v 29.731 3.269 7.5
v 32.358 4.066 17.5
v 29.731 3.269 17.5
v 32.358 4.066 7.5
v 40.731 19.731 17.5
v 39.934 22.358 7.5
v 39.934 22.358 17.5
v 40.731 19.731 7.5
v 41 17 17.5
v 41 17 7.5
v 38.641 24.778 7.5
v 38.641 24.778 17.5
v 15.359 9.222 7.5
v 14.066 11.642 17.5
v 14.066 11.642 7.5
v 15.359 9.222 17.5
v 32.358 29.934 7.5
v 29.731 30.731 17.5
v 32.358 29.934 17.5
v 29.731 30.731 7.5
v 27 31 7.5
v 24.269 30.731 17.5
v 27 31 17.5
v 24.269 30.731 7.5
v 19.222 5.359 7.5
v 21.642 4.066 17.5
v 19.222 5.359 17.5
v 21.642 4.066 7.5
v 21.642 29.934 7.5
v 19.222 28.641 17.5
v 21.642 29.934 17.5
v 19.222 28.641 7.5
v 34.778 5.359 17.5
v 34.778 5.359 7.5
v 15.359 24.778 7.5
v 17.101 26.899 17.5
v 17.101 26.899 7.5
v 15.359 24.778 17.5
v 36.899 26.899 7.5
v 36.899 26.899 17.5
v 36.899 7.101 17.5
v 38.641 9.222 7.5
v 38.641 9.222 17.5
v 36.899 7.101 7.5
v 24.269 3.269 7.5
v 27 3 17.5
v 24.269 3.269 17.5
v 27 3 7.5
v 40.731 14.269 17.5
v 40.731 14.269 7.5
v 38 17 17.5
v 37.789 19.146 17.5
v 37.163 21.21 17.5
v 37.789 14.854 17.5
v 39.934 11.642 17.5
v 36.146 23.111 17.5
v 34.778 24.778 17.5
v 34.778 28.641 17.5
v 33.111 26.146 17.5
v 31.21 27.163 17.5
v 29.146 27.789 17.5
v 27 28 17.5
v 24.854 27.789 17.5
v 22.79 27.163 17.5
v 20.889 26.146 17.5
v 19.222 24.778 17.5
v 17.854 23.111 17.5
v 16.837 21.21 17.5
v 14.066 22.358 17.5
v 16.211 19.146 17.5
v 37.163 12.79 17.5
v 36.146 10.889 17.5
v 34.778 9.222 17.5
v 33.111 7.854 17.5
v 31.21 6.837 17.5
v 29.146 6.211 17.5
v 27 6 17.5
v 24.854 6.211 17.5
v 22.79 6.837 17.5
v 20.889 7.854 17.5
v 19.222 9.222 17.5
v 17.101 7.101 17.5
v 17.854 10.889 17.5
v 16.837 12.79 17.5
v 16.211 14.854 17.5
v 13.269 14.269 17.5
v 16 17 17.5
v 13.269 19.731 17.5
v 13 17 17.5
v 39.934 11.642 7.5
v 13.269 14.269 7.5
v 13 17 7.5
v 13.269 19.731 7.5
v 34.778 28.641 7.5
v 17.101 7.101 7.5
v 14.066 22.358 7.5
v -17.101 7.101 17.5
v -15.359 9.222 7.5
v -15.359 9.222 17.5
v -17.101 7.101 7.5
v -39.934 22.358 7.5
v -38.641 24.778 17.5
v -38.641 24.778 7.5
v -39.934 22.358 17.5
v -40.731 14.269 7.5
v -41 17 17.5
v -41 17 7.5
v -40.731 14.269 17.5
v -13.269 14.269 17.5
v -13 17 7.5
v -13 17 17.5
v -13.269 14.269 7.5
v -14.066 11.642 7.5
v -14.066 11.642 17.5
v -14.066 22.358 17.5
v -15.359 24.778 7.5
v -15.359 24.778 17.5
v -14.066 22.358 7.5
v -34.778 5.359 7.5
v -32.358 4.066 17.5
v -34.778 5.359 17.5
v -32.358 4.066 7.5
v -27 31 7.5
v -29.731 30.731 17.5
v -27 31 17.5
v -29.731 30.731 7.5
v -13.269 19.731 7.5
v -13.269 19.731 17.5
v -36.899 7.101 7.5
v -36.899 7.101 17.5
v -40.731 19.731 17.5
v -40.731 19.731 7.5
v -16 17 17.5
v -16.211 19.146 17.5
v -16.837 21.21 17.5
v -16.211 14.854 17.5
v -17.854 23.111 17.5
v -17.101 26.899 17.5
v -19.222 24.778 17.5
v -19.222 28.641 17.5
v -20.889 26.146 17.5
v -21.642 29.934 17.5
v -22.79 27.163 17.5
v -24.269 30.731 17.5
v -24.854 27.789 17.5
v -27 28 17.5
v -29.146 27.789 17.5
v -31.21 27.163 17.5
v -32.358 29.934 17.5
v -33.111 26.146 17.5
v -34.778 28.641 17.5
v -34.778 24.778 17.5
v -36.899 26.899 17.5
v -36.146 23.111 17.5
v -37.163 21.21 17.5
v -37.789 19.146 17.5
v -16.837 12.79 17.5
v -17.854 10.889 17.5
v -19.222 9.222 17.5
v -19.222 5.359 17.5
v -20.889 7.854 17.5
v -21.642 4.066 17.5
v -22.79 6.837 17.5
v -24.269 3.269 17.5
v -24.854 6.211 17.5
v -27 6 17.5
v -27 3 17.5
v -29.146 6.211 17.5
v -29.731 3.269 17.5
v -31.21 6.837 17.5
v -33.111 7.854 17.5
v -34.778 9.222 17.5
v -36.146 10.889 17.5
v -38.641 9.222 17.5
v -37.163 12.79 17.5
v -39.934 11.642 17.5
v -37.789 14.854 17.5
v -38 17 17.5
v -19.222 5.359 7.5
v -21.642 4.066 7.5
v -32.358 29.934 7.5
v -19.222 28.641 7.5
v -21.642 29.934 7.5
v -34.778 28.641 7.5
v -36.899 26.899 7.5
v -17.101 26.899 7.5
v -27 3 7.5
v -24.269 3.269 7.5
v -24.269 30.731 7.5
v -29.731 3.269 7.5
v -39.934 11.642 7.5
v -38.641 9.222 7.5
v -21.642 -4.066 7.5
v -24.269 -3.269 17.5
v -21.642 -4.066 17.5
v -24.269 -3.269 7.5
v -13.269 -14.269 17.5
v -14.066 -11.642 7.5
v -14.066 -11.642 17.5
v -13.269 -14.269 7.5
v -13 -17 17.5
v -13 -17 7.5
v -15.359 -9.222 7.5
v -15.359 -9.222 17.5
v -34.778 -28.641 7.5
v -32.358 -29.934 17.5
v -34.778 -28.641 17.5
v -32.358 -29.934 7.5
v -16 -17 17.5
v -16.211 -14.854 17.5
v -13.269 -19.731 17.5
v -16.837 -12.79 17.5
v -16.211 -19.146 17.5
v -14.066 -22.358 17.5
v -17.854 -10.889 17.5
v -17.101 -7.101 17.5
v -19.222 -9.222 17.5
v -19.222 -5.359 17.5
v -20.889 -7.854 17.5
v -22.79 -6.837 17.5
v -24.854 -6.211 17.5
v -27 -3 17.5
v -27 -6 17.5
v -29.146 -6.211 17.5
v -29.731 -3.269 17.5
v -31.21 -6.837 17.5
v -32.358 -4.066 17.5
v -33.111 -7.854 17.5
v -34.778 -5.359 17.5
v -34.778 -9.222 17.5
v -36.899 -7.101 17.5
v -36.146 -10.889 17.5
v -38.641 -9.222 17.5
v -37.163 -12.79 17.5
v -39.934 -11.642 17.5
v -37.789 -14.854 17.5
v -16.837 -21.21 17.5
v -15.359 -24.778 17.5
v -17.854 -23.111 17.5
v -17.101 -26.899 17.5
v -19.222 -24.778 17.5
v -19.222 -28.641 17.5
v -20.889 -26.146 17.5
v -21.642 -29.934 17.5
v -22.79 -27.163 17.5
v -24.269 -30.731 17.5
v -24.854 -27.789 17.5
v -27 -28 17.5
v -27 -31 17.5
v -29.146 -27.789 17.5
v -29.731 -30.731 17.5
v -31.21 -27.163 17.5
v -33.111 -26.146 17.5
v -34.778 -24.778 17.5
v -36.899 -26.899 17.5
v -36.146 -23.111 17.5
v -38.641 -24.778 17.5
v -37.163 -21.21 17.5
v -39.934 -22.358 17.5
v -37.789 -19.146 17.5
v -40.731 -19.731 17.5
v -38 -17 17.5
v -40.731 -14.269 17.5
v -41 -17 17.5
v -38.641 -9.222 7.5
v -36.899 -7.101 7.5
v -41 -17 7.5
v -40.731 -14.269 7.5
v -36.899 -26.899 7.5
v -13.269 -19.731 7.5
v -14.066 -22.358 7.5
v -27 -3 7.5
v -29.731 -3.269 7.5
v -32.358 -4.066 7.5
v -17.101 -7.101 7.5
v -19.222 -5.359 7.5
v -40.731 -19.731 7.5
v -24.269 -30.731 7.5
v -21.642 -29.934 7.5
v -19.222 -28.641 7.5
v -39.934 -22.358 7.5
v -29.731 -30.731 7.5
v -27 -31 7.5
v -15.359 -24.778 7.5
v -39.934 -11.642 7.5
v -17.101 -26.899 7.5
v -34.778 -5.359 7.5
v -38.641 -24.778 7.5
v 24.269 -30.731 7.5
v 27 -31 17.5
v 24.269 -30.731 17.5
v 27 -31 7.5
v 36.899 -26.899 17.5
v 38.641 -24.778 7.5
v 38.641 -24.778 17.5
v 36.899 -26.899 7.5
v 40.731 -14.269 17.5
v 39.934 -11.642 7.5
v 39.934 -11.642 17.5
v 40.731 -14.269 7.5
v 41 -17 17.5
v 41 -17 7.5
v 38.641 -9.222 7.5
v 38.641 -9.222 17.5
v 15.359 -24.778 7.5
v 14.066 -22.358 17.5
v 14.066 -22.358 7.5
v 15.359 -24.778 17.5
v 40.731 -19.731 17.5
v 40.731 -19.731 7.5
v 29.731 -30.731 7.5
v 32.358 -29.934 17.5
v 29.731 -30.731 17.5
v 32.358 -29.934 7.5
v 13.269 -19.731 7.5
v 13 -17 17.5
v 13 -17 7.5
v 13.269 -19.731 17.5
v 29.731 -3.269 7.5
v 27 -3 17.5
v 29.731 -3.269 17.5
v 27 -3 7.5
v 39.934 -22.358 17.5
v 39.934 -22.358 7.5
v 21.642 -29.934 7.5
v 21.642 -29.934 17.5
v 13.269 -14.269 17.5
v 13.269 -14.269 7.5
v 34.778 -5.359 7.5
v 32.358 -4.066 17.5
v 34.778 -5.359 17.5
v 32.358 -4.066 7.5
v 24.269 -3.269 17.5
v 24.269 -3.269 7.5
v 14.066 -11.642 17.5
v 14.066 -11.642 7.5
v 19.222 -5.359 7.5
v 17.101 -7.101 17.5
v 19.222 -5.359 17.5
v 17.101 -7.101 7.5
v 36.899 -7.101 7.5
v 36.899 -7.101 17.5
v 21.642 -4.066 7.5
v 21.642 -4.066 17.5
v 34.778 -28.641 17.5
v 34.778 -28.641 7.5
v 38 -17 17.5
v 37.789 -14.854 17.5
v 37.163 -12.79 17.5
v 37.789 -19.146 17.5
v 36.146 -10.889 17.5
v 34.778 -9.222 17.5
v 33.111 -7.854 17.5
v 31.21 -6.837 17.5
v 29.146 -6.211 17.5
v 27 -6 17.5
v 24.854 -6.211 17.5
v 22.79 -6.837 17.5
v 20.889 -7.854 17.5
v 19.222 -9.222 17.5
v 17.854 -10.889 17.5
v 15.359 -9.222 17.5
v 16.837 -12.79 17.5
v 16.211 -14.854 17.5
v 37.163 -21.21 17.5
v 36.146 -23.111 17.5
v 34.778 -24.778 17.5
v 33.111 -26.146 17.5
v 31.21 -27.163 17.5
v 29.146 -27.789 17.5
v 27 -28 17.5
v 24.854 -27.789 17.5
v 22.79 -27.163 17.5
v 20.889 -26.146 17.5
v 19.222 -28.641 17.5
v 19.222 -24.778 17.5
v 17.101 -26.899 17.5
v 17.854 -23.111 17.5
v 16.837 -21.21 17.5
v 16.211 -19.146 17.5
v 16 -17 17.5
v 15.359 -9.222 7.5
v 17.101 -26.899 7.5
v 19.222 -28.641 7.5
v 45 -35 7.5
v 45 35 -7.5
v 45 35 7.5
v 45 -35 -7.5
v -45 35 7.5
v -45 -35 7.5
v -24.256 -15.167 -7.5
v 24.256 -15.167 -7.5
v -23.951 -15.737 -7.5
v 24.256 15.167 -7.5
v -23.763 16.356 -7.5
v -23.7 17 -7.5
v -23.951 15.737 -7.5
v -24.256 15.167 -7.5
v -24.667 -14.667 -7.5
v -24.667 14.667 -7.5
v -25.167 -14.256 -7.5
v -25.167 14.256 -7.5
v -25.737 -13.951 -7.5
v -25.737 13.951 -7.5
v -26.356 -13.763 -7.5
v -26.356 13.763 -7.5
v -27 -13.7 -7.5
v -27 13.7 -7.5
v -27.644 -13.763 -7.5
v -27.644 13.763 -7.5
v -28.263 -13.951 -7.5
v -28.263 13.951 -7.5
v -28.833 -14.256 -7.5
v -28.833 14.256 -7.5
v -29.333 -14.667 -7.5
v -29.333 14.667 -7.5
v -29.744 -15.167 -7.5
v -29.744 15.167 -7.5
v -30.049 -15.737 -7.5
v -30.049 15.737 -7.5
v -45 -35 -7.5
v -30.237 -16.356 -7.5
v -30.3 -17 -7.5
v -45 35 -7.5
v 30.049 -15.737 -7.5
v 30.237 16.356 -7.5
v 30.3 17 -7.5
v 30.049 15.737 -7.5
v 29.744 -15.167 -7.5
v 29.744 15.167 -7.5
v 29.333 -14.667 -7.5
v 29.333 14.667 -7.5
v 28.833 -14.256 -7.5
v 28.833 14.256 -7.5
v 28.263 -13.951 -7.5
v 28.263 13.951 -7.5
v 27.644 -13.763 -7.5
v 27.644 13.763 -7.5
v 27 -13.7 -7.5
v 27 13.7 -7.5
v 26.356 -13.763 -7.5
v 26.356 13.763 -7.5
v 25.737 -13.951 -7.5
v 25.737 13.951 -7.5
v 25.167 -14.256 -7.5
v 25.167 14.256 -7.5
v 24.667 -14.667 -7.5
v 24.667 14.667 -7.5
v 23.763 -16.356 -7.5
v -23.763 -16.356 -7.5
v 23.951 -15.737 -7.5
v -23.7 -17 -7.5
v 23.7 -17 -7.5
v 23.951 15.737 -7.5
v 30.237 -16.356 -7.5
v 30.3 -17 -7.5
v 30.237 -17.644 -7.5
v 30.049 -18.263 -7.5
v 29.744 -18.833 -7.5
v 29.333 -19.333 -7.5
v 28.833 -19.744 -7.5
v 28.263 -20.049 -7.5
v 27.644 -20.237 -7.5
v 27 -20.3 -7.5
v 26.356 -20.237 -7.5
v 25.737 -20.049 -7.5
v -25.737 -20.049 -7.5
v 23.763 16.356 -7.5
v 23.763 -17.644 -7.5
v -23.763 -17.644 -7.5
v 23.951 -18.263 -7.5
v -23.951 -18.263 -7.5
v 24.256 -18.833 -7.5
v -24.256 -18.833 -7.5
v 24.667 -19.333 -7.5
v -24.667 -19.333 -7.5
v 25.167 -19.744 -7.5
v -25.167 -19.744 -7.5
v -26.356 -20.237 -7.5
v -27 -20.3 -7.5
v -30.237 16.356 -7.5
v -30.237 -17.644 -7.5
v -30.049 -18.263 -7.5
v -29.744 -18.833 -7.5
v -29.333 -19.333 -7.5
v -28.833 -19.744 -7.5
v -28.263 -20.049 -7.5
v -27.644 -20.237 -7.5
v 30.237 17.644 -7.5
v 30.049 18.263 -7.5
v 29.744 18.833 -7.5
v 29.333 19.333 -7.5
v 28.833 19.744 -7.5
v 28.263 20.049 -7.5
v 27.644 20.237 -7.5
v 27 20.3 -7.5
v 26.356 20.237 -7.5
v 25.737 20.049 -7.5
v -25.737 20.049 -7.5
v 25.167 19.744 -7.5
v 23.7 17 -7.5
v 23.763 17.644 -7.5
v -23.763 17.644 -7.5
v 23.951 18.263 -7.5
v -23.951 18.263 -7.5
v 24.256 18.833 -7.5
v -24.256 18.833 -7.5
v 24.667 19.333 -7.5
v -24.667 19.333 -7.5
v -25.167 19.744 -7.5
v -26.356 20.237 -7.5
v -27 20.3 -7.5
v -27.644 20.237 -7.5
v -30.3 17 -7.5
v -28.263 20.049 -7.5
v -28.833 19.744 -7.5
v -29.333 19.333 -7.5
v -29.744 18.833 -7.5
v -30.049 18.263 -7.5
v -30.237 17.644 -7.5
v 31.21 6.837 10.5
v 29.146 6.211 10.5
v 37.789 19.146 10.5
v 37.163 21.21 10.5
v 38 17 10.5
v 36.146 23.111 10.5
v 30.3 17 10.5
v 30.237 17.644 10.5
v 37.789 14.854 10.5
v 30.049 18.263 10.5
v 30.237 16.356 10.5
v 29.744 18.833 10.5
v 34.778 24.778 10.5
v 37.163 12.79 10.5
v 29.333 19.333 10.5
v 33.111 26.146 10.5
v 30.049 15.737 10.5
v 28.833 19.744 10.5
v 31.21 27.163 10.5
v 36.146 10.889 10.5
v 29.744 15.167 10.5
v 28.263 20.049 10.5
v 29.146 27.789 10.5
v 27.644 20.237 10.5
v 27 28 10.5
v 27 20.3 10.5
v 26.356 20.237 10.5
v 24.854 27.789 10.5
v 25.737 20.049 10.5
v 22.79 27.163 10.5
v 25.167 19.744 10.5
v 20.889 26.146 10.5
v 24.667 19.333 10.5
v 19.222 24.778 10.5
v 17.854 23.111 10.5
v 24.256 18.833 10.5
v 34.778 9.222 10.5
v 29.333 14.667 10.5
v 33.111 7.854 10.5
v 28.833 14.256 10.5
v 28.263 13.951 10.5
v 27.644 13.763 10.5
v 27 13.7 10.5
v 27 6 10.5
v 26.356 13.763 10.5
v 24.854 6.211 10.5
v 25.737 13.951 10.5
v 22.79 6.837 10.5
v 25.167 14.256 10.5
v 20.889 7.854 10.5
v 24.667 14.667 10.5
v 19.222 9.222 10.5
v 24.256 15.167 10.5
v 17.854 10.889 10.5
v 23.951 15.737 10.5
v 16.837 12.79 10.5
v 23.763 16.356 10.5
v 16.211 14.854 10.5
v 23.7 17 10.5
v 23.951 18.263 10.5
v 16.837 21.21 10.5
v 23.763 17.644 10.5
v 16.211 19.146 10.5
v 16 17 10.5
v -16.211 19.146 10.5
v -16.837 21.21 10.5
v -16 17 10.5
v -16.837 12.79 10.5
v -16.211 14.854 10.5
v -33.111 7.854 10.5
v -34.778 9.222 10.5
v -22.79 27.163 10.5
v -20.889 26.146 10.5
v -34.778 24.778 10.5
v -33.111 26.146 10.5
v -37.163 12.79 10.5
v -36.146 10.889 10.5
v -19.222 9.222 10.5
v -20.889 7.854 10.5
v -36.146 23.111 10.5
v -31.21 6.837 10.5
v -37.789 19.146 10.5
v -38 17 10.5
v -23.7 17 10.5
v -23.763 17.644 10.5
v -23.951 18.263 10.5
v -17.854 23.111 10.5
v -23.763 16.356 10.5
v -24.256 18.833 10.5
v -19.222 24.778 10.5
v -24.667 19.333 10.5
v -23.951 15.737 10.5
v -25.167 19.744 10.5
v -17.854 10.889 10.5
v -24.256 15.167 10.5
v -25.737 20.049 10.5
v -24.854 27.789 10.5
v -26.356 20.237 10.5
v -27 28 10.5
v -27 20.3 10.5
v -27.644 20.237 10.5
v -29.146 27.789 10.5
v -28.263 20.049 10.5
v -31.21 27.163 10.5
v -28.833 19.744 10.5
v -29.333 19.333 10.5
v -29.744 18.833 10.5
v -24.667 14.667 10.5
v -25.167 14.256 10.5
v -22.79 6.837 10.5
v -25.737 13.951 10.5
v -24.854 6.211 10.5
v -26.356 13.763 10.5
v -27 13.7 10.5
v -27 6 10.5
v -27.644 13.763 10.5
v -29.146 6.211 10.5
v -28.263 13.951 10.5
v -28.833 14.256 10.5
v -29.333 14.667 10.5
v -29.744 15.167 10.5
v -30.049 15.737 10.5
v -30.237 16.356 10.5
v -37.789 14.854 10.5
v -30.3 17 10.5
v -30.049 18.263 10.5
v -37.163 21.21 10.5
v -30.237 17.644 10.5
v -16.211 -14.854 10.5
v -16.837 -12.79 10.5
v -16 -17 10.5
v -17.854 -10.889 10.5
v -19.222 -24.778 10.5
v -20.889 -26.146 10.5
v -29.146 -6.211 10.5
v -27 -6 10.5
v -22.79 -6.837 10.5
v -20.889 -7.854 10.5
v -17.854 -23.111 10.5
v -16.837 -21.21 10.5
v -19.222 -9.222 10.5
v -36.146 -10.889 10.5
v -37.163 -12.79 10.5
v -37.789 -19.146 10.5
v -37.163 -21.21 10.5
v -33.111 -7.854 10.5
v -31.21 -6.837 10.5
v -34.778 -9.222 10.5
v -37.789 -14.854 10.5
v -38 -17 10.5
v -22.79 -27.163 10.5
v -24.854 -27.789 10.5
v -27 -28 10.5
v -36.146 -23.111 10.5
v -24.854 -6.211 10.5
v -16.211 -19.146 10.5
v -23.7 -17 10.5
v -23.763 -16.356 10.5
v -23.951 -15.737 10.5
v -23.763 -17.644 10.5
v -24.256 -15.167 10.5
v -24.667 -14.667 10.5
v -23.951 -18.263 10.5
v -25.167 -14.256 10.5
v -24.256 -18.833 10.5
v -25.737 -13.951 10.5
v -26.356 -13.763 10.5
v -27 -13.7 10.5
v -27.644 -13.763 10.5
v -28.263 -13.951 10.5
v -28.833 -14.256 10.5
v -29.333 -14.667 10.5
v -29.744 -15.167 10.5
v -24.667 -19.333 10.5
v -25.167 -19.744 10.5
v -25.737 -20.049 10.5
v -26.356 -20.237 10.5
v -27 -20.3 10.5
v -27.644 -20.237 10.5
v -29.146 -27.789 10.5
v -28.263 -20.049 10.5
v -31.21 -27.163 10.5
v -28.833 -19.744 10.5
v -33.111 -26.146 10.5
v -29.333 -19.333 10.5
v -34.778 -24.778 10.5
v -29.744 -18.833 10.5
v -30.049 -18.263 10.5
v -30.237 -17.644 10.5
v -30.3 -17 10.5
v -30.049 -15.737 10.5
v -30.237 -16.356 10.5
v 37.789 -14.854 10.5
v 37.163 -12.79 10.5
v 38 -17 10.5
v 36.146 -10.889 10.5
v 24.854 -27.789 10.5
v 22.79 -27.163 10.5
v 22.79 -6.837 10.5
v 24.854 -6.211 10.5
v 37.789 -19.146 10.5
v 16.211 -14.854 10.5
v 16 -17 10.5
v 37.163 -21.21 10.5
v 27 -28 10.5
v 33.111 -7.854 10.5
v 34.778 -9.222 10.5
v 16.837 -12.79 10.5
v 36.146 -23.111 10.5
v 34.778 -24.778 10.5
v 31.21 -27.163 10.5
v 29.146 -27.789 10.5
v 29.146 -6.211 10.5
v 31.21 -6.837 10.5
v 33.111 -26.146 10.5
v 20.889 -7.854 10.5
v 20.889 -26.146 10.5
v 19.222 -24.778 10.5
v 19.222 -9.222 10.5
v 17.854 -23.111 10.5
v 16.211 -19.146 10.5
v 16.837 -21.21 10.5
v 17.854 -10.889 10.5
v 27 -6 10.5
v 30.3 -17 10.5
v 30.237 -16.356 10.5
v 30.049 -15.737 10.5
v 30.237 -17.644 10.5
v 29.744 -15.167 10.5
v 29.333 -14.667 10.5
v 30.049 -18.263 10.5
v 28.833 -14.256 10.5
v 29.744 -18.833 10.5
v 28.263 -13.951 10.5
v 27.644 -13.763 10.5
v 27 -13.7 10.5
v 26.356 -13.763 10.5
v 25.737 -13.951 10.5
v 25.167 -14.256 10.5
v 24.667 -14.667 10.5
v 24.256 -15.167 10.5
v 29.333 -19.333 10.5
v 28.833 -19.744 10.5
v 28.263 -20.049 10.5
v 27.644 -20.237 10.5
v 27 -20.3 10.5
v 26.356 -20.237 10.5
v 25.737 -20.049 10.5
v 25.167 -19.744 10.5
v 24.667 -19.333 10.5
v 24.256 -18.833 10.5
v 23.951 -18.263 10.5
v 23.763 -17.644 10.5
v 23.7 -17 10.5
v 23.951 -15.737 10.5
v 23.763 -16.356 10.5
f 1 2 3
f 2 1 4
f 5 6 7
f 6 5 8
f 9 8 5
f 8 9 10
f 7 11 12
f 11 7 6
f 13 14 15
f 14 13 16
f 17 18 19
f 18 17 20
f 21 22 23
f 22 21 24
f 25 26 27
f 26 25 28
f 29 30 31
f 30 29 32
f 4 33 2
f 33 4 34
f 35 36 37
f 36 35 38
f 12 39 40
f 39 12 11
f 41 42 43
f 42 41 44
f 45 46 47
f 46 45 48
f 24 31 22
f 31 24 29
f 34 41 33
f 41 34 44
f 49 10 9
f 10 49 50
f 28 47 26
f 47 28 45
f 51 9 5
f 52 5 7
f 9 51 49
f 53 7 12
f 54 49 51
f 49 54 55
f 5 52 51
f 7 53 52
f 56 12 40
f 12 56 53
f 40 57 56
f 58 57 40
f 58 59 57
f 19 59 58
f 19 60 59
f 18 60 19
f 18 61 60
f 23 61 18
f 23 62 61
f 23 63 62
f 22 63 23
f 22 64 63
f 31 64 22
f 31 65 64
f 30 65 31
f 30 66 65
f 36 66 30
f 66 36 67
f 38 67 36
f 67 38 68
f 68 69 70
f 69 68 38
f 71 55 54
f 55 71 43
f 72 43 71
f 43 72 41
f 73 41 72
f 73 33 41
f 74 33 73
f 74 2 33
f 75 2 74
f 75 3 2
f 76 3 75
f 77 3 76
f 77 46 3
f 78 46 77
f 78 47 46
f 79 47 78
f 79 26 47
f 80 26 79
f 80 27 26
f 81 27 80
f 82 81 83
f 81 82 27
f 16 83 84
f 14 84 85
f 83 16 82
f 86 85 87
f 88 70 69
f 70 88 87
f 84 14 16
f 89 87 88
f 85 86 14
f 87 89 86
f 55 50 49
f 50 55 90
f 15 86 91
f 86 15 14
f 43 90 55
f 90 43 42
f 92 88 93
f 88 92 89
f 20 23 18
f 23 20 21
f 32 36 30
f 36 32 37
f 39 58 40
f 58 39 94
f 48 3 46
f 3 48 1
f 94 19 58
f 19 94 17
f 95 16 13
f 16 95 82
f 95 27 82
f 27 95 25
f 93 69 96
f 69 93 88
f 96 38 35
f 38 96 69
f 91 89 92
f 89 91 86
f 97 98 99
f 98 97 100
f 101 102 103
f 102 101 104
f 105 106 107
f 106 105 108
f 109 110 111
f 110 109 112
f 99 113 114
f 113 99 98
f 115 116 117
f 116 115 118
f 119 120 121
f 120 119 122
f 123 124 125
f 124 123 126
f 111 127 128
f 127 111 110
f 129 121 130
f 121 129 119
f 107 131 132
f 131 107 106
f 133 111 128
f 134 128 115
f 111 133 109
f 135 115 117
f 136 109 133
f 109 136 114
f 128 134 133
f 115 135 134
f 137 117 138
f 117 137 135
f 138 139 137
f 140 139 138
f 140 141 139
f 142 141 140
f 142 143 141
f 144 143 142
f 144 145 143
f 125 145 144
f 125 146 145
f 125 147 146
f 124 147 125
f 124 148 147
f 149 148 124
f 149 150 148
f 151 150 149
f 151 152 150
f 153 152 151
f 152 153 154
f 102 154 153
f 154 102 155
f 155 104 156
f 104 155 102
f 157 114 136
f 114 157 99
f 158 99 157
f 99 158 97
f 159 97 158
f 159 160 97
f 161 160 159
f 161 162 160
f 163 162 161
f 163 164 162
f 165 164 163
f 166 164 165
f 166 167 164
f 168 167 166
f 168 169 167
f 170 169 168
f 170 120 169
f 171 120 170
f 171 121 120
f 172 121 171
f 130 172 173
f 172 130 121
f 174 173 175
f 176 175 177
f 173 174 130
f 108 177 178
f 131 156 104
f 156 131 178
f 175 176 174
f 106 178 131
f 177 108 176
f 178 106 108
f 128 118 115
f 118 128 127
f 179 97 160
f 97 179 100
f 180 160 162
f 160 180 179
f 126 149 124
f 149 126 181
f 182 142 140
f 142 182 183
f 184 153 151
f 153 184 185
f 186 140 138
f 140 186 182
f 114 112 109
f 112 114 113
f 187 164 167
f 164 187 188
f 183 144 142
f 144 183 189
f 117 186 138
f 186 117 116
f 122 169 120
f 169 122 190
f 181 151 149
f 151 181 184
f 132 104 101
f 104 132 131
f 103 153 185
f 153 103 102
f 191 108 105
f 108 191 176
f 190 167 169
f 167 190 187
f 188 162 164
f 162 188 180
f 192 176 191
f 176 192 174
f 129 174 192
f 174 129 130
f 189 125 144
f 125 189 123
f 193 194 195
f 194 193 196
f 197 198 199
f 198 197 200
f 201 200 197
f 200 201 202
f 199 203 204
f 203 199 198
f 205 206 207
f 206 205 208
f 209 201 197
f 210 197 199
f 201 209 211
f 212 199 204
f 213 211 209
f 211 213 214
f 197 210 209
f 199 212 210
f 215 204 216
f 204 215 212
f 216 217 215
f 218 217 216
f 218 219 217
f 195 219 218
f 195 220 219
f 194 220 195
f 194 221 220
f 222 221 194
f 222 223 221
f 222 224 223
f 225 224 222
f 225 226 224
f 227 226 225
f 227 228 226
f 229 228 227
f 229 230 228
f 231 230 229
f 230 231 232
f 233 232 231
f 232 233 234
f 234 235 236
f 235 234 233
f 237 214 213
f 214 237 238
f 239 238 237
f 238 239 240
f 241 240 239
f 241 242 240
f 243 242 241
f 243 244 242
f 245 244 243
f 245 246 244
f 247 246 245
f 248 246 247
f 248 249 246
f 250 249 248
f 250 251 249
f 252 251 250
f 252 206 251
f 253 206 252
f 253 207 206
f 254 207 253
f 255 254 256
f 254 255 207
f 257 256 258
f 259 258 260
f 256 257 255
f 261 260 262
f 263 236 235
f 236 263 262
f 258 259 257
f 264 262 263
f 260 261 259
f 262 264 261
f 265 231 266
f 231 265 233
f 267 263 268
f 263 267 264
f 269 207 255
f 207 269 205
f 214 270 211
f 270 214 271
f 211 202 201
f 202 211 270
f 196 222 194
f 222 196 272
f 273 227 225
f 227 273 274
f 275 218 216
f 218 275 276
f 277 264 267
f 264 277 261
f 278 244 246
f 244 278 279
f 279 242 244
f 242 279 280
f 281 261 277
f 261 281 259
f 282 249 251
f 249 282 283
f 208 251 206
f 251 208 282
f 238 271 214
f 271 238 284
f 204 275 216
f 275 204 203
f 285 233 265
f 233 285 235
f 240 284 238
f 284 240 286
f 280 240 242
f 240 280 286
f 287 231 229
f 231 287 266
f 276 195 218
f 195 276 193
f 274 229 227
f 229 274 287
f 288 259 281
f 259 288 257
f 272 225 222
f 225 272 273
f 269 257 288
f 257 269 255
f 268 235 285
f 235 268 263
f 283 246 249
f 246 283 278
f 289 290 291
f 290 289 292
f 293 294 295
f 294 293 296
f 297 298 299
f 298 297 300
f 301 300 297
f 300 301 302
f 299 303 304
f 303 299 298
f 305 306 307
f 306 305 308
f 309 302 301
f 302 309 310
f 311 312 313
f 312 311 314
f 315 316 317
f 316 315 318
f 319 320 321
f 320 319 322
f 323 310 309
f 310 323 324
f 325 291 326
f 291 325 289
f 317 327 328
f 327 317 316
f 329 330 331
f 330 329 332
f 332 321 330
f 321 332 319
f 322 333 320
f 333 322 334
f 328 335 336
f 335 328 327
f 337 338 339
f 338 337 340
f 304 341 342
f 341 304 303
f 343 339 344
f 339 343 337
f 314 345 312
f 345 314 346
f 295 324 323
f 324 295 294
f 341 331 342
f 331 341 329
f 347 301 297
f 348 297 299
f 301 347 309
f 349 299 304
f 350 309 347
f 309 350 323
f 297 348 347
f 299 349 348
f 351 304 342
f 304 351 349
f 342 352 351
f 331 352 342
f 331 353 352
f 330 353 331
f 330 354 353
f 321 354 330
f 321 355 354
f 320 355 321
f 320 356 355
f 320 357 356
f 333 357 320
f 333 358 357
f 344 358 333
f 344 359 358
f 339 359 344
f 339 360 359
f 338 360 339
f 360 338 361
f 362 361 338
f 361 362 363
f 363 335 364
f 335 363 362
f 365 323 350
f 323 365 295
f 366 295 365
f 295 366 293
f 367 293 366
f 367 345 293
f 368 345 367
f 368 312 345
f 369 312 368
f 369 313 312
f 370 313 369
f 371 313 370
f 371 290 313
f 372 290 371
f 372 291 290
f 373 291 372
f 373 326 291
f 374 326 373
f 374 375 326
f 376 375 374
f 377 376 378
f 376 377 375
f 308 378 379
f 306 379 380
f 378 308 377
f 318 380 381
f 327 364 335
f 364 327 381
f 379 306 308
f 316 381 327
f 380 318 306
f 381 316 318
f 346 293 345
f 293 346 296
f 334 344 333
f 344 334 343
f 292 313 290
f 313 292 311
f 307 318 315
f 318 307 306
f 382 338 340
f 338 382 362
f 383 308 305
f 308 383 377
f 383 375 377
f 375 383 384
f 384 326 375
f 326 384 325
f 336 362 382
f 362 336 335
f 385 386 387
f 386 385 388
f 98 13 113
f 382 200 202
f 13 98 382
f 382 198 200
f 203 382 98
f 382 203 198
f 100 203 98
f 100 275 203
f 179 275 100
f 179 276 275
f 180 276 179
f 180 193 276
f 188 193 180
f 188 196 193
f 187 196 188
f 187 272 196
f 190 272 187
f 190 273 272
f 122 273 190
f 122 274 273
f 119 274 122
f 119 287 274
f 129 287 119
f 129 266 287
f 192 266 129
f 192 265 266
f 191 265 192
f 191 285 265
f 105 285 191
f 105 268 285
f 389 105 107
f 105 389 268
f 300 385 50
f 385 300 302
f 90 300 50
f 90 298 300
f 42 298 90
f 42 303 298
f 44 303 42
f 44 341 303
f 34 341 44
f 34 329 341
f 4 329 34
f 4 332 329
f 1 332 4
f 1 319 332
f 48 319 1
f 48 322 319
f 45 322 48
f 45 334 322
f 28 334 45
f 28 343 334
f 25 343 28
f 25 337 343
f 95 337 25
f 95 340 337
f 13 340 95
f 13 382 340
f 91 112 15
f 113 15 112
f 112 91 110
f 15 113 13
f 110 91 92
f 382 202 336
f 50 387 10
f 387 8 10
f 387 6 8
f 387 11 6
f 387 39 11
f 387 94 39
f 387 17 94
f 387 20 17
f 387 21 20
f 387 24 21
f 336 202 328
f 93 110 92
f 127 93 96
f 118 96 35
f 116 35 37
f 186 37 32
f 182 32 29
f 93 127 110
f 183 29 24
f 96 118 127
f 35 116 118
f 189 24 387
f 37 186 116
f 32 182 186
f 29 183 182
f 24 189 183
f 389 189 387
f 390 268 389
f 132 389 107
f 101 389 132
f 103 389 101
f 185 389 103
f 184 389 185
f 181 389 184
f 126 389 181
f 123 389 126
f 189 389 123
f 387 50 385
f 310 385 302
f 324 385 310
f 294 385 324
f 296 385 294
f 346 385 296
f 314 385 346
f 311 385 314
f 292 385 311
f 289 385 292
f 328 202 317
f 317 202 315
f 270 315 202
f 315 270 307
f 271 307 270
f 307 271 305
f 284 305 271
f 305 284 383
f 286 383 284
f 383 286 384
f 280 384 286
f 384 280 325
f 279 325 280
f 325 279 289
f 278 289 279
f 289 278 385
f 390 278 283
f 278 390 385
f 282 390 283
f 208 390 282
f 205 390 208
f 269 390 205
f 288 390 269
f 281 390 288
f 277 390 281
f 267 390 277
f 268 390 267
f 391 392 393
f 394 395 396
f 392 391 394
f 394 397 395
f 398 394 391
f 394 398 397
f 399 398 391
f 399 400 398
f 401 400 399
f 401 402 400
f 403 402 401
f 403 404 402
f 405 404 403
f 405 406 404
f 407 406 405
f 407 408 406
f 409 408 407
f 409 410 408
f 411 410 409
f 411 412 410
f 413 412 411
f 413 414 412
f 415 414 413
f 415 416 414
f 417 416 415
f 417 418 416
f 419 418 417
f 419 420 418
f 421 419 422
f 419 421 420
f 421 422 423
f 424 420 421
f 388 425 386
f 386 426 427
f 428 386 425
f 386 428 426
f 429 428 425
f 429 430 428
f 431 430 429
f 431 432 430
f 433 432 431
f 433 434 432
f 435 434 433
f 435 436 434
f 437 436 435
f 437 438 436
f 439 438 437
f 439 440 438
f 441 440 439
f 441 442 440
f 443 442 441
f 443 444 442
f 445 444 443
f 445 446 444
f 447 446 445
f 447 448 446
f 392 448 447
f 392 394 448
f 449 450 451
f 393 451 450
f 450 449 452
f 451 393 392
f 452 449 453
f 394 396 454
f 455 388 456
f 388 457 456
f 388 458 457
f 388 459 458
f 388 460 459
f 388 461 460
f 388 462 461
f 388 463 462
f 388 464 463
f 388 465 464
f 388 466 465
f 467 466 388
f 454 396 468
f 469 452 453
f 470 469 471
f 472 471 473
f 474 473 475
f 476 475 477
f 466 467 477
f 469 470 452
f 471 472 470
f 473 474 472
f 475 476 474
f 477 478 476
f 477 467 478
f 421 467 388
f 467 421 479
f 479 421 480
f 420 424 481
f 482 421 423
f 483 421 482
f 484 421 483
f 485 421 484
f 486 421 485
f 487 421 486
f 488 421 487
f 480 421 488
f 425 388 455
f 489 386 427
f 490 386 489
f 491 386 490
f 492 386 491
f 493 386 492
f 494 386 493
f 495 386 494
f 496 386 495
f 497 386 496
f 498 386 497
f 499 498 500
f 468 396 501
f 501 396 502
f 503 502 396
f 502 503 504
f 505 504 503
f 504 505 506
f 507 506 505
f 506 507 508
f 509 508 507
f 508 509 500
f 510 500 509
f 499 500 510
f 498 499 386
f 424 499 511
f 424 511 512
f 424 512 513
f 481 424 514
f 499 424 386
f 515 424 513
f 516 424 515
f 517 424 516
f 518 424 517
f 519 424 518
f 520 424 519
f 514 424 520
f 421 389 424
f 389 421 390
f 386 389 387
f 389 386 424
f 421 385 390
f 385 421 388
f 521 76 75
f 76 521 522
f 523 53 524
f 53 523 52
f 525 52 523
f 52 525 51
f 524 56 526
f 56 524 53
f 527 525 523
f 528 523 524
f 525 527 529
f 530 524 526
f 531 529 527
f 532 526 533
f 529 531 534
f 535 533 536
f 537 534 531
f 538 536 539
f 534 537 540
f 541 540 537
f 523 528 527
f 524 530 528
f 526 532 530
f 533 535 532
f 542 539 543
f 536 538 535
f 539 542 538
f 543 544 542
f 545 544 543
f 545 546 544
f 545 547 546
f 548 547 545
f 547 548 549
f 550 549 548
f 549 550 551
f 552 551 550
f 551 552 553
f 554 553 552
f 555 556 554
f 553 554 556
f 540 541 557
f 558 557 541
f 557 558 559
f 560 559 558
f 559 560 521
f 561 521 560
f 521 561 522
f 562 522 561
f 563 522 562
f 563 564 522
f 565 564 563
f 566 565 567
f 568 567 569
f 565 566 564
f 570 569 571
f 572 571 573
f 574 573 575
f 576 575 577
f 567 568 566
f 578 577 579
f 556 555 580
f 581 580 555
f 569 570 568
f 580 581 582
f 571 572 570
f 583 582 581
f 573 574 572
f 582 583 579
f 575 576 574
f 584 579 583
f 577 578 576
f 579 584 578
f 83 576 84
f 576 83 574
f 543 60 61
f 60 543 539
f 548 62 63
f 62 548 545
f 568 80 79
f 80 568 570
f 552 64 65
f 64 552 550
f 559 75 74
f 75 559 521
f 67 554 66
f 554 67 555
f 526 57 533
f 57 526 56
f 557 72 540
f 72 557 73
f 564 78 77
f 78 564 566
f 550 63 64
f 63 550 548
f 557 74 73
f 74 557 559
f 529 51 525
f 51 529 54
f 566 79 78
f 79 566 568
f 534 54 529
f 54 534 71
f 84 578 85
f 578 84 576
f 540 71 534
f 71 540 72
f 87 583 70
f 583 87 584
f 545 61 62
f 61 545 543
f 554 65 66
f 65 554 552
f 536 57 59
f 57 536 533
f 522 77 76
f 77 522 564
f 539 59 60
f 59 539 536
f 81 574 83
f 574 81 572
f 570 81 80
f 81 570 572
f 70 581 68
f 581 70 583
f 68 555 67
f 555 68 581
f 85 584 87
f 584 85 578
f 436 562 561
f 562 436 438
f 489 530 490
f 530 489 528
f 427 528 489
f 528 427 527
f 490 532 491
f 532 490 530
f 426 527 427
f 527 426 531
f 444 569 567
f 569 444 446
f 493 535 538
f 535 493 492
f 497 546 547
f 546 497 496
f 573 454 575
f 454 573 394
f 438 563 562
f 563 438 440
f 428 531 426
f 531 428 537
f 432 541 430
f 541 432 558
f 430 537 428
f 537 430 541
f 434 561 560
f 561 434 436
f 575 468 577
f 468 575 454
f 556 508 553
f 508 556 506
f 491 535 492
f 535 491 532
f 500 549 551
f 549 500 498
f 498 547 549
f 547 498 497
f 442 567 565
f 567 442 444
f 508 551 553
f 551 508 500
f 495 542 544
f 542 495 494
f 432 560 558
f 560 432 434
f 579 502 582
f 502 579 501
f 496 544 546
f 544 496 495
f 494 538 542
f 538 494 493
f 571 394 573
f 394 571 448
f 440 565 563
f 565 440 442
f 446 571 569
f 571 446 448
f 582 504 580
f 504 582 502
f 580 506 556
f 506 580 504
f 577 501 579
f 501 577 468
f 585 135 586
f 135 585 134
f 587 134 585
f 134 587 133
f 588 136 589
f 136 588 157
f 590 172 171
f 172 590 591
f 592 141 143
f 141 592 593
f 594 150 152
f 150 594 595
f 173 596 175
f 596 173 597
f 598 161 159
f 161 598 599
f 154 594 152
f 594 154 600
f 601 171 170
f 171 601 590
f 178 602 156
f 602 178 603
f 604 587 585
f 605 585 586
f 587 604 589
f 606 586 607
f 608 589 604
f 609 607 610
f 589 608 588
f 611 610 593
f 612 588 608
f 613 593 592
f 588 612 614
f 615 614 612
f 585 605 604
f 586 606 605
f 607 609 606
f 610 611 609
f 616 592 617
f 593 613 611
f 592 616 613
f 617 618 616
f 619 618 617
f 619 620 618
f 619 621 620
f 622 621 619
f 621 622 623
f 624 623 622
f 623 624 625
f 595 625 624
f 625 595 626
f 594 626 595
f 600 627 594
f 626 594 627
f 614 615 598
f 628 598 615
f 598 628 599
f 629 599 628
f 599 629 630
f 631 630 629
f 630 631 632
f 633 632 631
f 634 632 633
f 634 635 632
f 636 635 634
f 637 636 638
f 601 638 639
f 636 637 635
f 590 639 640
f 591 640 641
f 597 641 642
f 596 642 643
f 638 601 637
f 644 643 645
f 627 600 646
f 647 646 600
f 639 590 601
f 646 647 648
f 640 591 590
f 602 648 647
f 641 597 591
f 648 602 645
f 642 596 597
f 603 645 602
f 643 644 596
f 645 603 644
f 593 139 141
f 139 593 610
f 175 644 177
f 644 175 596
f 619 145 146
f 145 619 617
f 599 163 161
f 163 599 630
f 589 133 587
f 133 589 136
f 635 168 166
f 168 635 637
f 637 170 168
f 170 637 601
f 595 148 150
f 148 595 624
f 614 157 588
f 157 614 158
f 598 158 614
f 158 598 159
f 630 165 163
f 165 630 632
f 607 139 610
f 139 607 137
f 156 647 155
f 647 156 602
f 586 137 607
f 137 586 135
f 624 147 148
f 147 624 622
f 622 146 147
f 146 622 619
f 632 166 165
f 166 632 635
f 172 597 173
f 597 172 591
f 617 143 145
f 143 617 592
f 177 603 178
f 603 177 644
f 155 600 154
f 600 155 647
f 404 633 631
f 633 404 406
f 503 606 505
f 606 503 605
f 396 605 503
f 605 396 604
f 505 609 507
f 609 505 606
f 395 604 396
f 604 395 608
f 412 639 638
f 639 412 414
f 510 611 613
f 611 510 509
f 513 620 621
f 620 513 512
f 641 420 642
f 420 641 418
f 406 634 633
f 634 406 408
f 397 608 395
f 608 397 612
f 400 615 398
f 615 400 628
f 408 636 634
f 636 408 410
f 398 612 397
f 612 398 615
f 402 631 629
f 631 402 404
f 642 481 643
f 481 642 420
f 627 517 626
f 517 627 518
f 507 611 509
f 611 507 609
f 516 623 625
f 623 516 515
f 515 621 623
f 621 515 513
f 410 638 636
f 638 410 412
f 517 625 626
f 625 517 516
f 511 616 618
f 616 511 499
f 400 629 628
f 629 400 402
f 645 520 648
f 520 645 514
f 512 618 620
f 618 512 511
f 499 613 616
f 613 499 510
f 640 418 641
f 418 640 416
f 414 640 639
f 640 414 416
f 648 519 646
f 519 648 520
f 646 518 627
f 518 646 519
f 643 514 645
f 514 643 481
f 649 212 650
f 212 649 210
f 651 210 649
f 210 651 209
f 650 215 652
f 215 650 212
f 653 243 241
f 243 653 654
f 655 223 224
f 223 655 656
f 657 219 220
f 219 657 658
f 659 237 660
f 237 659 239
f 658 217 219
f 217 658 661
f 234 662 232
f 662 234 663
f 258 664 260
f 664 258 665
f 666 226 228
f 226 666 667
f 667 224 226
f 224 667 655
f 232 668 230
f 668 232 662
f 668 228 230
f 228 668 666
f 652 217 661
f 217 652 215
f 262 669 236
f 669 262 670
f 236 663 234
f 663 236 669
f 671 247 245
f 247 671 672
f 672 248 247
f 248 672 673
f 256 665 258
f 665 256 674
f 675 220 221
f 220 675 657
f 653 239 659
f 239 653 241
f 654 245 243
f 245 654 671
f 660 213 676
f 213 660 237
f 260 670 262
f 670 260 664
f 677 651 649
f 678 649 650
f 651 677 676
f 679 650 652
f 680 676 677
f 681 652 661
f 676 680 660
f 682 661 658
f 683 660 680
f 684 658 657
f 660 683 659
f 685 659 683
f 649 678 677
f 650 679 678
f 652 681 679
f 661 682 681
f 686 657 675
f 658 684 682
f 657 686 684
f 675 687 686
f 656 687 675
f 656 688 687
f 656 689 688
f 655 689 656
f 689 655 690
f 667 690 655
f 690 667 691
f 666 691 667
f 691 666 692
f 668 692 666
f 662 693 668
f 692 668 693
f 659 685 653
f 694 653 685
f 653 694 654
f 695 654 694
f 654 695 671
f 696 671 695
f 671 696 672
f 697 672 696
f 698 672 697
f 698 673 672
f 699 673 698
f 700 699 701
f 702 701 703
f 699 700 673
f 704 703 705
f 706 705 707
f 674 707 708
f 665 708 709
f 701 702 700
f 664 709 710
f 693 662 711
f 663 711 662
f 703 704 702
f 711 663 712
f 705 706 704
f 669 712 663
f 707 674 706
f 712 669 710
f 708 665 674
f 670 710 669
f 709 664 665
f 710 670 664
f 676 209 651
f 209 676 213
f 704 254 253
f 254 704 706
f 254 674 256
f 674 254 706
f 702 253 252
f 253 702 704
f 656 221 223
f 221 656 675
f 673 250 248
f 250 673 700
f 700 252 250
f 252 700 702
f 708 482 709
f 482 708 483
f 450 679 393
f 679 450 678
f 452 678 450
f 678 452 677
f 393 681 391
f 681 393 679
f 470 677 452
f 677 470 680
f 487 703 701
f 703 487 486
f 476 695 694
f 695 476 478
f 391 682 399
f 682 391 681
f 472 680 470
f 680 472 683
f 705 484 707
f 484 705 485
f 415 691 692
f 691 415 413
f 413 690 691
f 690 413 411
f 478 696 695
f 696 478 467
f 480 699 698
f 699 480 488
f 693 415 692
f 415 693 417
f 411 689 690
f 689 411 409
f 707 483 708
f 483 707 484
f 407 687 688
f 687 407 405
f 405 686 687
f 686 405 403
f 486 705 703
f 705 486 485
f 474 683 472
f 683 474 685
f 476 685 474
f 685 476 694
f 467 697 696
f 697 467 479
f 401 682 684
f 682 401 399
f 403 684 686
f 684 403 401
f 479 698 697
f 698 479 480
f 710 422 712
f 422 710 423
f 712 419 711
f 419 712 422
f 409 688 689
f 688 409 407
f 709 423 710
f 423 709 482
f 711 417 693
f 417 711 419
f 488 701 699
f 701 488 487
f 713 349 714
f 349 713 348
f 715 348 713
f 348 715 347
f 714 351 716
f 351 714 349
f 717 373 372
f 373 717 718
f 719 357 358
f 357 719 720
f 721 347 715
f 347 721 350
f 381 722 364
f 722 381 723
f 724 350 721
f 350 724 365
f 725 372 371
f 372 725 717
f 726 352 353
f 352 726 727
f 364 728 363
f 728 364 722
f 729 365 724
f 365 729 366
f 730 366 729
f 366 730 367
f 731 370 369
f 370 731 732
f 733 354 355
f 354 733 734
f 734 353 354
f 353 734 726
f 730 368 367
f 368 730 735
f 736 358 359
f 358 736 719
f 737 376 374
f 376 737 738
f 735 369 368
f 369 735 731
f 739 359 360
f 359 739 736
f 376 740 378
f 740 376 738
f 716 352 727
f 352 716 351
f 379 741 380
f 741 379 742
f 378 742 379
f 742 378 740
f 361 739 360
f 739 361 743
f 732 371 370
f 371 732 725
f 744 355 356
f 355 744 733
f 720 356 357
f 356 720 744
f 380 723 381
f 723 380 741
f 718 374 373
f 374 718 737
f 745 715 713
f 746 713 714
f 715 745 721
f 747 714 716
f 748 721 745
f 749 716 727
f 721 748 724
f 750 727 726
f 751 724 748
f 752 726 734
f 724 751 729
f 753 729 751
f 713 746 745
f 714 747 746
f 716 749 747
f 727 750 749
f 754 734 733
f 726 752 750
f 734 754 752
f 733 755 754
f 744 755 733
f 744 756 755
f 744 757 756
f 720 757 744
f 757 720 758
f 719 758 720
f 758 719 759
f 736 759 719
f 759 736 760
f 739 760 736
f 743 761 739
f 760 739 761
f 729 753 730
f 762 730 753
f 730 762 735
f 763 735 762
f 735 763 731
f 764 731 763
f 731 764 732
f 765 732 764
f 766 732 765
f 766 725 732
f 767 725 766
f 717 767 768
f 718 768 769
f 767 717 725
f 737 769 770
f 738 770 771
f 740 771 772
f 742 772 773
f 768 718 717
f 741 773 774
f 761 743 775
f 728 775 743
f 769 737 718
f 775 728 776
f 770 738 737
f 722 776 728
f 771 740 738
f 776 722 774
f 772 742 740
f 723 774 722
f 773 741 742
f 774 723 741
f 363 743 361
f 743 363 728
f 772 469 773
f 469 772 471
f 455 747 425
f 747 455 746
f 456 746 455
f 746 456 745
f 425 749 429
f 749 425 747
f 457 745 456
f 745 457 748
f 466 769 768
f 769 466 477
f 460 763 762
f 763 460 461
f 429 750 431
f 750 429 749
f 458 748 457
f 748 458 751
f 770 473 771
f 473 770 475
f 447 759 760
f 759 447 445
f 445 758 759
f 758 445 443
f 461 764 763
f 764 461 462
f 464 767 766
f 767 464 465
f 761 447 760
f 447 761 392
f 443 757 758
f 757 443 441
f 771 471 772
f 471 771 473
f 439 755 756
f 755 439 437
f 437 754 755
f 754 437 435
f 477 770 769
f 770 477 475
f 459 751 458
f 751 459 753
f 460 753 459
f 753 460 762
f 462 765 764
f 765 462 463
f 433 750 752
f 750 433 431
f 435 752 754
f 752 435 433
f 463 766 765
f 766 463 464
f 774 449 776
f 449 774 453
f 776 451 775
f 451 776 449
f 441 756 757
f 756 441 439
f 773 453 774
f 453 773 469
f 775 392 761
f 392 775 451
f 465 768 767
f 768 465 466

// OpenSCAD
$fn = 32;

// ----------------------------------------------------------------------
// Socket pad plate
// bosses with counterbored sockets for the screws
// ----------------------------------------------------------------------

// --- parameters (mm) ---
base_t = 15;           // base plate thickness
seat_tol = 0.05;       // tolerance at the seating features
free_tol = 0.3;        // general tolerance on the free sizes
boss_h = 10;           // boss height above the base plate
boss_d = 28;           // boss diameter
socket_d = 22;         // socket diameter
socket_depth = 7;      // socket depth from the boss face
bolt_d = 6.6;          // screw clearance hole through the socket floor
plate = [90, 70, 15];  // overall size (x, y, z)
edge = 18;             // boss centre offset from the plate edge
pads = 4;              // boss count, one per corner

// --- derived feature positions (mm) ---
height = base_t + boss_h;        // = 25   overall height of the part
corner_x = plate[0] / 2 - edge;  // = 27   boss centre X
corner_y = plate[1] / 2 - edge;  // = 17   boss centre Y
feature_centers = [
  [corner_x, corner_y],
  [-corner_x, corner_y],
  [-corner_x, -corner_y],
  [corner_x, -corner_y]
];   // boss centres: sockets, holes and the pads themselves are placed from here

// base plate, bosses on feature_centers, socket + through hole in each
difference() {
  union() {
    cube(plate, center = true);
    for (centre = feature_centers)
      translate([centre[0], centre[1], plate[2] / 2 - 1])
        cylinder(d = boss_d, h = boss_h + 1);
  }
  for (centre = feature_centers) {
    translate([centre[0], centre[1], plate[2] / 2 + boss_h - socket_depth])
      cylinder(d = socket_d, h = socket_depth + 1);
    translate([centre[0], centre[1], -height])
      cylinder(d = bolt_d, h = 2 * height + 2);  // through the socket floor
  }
}
